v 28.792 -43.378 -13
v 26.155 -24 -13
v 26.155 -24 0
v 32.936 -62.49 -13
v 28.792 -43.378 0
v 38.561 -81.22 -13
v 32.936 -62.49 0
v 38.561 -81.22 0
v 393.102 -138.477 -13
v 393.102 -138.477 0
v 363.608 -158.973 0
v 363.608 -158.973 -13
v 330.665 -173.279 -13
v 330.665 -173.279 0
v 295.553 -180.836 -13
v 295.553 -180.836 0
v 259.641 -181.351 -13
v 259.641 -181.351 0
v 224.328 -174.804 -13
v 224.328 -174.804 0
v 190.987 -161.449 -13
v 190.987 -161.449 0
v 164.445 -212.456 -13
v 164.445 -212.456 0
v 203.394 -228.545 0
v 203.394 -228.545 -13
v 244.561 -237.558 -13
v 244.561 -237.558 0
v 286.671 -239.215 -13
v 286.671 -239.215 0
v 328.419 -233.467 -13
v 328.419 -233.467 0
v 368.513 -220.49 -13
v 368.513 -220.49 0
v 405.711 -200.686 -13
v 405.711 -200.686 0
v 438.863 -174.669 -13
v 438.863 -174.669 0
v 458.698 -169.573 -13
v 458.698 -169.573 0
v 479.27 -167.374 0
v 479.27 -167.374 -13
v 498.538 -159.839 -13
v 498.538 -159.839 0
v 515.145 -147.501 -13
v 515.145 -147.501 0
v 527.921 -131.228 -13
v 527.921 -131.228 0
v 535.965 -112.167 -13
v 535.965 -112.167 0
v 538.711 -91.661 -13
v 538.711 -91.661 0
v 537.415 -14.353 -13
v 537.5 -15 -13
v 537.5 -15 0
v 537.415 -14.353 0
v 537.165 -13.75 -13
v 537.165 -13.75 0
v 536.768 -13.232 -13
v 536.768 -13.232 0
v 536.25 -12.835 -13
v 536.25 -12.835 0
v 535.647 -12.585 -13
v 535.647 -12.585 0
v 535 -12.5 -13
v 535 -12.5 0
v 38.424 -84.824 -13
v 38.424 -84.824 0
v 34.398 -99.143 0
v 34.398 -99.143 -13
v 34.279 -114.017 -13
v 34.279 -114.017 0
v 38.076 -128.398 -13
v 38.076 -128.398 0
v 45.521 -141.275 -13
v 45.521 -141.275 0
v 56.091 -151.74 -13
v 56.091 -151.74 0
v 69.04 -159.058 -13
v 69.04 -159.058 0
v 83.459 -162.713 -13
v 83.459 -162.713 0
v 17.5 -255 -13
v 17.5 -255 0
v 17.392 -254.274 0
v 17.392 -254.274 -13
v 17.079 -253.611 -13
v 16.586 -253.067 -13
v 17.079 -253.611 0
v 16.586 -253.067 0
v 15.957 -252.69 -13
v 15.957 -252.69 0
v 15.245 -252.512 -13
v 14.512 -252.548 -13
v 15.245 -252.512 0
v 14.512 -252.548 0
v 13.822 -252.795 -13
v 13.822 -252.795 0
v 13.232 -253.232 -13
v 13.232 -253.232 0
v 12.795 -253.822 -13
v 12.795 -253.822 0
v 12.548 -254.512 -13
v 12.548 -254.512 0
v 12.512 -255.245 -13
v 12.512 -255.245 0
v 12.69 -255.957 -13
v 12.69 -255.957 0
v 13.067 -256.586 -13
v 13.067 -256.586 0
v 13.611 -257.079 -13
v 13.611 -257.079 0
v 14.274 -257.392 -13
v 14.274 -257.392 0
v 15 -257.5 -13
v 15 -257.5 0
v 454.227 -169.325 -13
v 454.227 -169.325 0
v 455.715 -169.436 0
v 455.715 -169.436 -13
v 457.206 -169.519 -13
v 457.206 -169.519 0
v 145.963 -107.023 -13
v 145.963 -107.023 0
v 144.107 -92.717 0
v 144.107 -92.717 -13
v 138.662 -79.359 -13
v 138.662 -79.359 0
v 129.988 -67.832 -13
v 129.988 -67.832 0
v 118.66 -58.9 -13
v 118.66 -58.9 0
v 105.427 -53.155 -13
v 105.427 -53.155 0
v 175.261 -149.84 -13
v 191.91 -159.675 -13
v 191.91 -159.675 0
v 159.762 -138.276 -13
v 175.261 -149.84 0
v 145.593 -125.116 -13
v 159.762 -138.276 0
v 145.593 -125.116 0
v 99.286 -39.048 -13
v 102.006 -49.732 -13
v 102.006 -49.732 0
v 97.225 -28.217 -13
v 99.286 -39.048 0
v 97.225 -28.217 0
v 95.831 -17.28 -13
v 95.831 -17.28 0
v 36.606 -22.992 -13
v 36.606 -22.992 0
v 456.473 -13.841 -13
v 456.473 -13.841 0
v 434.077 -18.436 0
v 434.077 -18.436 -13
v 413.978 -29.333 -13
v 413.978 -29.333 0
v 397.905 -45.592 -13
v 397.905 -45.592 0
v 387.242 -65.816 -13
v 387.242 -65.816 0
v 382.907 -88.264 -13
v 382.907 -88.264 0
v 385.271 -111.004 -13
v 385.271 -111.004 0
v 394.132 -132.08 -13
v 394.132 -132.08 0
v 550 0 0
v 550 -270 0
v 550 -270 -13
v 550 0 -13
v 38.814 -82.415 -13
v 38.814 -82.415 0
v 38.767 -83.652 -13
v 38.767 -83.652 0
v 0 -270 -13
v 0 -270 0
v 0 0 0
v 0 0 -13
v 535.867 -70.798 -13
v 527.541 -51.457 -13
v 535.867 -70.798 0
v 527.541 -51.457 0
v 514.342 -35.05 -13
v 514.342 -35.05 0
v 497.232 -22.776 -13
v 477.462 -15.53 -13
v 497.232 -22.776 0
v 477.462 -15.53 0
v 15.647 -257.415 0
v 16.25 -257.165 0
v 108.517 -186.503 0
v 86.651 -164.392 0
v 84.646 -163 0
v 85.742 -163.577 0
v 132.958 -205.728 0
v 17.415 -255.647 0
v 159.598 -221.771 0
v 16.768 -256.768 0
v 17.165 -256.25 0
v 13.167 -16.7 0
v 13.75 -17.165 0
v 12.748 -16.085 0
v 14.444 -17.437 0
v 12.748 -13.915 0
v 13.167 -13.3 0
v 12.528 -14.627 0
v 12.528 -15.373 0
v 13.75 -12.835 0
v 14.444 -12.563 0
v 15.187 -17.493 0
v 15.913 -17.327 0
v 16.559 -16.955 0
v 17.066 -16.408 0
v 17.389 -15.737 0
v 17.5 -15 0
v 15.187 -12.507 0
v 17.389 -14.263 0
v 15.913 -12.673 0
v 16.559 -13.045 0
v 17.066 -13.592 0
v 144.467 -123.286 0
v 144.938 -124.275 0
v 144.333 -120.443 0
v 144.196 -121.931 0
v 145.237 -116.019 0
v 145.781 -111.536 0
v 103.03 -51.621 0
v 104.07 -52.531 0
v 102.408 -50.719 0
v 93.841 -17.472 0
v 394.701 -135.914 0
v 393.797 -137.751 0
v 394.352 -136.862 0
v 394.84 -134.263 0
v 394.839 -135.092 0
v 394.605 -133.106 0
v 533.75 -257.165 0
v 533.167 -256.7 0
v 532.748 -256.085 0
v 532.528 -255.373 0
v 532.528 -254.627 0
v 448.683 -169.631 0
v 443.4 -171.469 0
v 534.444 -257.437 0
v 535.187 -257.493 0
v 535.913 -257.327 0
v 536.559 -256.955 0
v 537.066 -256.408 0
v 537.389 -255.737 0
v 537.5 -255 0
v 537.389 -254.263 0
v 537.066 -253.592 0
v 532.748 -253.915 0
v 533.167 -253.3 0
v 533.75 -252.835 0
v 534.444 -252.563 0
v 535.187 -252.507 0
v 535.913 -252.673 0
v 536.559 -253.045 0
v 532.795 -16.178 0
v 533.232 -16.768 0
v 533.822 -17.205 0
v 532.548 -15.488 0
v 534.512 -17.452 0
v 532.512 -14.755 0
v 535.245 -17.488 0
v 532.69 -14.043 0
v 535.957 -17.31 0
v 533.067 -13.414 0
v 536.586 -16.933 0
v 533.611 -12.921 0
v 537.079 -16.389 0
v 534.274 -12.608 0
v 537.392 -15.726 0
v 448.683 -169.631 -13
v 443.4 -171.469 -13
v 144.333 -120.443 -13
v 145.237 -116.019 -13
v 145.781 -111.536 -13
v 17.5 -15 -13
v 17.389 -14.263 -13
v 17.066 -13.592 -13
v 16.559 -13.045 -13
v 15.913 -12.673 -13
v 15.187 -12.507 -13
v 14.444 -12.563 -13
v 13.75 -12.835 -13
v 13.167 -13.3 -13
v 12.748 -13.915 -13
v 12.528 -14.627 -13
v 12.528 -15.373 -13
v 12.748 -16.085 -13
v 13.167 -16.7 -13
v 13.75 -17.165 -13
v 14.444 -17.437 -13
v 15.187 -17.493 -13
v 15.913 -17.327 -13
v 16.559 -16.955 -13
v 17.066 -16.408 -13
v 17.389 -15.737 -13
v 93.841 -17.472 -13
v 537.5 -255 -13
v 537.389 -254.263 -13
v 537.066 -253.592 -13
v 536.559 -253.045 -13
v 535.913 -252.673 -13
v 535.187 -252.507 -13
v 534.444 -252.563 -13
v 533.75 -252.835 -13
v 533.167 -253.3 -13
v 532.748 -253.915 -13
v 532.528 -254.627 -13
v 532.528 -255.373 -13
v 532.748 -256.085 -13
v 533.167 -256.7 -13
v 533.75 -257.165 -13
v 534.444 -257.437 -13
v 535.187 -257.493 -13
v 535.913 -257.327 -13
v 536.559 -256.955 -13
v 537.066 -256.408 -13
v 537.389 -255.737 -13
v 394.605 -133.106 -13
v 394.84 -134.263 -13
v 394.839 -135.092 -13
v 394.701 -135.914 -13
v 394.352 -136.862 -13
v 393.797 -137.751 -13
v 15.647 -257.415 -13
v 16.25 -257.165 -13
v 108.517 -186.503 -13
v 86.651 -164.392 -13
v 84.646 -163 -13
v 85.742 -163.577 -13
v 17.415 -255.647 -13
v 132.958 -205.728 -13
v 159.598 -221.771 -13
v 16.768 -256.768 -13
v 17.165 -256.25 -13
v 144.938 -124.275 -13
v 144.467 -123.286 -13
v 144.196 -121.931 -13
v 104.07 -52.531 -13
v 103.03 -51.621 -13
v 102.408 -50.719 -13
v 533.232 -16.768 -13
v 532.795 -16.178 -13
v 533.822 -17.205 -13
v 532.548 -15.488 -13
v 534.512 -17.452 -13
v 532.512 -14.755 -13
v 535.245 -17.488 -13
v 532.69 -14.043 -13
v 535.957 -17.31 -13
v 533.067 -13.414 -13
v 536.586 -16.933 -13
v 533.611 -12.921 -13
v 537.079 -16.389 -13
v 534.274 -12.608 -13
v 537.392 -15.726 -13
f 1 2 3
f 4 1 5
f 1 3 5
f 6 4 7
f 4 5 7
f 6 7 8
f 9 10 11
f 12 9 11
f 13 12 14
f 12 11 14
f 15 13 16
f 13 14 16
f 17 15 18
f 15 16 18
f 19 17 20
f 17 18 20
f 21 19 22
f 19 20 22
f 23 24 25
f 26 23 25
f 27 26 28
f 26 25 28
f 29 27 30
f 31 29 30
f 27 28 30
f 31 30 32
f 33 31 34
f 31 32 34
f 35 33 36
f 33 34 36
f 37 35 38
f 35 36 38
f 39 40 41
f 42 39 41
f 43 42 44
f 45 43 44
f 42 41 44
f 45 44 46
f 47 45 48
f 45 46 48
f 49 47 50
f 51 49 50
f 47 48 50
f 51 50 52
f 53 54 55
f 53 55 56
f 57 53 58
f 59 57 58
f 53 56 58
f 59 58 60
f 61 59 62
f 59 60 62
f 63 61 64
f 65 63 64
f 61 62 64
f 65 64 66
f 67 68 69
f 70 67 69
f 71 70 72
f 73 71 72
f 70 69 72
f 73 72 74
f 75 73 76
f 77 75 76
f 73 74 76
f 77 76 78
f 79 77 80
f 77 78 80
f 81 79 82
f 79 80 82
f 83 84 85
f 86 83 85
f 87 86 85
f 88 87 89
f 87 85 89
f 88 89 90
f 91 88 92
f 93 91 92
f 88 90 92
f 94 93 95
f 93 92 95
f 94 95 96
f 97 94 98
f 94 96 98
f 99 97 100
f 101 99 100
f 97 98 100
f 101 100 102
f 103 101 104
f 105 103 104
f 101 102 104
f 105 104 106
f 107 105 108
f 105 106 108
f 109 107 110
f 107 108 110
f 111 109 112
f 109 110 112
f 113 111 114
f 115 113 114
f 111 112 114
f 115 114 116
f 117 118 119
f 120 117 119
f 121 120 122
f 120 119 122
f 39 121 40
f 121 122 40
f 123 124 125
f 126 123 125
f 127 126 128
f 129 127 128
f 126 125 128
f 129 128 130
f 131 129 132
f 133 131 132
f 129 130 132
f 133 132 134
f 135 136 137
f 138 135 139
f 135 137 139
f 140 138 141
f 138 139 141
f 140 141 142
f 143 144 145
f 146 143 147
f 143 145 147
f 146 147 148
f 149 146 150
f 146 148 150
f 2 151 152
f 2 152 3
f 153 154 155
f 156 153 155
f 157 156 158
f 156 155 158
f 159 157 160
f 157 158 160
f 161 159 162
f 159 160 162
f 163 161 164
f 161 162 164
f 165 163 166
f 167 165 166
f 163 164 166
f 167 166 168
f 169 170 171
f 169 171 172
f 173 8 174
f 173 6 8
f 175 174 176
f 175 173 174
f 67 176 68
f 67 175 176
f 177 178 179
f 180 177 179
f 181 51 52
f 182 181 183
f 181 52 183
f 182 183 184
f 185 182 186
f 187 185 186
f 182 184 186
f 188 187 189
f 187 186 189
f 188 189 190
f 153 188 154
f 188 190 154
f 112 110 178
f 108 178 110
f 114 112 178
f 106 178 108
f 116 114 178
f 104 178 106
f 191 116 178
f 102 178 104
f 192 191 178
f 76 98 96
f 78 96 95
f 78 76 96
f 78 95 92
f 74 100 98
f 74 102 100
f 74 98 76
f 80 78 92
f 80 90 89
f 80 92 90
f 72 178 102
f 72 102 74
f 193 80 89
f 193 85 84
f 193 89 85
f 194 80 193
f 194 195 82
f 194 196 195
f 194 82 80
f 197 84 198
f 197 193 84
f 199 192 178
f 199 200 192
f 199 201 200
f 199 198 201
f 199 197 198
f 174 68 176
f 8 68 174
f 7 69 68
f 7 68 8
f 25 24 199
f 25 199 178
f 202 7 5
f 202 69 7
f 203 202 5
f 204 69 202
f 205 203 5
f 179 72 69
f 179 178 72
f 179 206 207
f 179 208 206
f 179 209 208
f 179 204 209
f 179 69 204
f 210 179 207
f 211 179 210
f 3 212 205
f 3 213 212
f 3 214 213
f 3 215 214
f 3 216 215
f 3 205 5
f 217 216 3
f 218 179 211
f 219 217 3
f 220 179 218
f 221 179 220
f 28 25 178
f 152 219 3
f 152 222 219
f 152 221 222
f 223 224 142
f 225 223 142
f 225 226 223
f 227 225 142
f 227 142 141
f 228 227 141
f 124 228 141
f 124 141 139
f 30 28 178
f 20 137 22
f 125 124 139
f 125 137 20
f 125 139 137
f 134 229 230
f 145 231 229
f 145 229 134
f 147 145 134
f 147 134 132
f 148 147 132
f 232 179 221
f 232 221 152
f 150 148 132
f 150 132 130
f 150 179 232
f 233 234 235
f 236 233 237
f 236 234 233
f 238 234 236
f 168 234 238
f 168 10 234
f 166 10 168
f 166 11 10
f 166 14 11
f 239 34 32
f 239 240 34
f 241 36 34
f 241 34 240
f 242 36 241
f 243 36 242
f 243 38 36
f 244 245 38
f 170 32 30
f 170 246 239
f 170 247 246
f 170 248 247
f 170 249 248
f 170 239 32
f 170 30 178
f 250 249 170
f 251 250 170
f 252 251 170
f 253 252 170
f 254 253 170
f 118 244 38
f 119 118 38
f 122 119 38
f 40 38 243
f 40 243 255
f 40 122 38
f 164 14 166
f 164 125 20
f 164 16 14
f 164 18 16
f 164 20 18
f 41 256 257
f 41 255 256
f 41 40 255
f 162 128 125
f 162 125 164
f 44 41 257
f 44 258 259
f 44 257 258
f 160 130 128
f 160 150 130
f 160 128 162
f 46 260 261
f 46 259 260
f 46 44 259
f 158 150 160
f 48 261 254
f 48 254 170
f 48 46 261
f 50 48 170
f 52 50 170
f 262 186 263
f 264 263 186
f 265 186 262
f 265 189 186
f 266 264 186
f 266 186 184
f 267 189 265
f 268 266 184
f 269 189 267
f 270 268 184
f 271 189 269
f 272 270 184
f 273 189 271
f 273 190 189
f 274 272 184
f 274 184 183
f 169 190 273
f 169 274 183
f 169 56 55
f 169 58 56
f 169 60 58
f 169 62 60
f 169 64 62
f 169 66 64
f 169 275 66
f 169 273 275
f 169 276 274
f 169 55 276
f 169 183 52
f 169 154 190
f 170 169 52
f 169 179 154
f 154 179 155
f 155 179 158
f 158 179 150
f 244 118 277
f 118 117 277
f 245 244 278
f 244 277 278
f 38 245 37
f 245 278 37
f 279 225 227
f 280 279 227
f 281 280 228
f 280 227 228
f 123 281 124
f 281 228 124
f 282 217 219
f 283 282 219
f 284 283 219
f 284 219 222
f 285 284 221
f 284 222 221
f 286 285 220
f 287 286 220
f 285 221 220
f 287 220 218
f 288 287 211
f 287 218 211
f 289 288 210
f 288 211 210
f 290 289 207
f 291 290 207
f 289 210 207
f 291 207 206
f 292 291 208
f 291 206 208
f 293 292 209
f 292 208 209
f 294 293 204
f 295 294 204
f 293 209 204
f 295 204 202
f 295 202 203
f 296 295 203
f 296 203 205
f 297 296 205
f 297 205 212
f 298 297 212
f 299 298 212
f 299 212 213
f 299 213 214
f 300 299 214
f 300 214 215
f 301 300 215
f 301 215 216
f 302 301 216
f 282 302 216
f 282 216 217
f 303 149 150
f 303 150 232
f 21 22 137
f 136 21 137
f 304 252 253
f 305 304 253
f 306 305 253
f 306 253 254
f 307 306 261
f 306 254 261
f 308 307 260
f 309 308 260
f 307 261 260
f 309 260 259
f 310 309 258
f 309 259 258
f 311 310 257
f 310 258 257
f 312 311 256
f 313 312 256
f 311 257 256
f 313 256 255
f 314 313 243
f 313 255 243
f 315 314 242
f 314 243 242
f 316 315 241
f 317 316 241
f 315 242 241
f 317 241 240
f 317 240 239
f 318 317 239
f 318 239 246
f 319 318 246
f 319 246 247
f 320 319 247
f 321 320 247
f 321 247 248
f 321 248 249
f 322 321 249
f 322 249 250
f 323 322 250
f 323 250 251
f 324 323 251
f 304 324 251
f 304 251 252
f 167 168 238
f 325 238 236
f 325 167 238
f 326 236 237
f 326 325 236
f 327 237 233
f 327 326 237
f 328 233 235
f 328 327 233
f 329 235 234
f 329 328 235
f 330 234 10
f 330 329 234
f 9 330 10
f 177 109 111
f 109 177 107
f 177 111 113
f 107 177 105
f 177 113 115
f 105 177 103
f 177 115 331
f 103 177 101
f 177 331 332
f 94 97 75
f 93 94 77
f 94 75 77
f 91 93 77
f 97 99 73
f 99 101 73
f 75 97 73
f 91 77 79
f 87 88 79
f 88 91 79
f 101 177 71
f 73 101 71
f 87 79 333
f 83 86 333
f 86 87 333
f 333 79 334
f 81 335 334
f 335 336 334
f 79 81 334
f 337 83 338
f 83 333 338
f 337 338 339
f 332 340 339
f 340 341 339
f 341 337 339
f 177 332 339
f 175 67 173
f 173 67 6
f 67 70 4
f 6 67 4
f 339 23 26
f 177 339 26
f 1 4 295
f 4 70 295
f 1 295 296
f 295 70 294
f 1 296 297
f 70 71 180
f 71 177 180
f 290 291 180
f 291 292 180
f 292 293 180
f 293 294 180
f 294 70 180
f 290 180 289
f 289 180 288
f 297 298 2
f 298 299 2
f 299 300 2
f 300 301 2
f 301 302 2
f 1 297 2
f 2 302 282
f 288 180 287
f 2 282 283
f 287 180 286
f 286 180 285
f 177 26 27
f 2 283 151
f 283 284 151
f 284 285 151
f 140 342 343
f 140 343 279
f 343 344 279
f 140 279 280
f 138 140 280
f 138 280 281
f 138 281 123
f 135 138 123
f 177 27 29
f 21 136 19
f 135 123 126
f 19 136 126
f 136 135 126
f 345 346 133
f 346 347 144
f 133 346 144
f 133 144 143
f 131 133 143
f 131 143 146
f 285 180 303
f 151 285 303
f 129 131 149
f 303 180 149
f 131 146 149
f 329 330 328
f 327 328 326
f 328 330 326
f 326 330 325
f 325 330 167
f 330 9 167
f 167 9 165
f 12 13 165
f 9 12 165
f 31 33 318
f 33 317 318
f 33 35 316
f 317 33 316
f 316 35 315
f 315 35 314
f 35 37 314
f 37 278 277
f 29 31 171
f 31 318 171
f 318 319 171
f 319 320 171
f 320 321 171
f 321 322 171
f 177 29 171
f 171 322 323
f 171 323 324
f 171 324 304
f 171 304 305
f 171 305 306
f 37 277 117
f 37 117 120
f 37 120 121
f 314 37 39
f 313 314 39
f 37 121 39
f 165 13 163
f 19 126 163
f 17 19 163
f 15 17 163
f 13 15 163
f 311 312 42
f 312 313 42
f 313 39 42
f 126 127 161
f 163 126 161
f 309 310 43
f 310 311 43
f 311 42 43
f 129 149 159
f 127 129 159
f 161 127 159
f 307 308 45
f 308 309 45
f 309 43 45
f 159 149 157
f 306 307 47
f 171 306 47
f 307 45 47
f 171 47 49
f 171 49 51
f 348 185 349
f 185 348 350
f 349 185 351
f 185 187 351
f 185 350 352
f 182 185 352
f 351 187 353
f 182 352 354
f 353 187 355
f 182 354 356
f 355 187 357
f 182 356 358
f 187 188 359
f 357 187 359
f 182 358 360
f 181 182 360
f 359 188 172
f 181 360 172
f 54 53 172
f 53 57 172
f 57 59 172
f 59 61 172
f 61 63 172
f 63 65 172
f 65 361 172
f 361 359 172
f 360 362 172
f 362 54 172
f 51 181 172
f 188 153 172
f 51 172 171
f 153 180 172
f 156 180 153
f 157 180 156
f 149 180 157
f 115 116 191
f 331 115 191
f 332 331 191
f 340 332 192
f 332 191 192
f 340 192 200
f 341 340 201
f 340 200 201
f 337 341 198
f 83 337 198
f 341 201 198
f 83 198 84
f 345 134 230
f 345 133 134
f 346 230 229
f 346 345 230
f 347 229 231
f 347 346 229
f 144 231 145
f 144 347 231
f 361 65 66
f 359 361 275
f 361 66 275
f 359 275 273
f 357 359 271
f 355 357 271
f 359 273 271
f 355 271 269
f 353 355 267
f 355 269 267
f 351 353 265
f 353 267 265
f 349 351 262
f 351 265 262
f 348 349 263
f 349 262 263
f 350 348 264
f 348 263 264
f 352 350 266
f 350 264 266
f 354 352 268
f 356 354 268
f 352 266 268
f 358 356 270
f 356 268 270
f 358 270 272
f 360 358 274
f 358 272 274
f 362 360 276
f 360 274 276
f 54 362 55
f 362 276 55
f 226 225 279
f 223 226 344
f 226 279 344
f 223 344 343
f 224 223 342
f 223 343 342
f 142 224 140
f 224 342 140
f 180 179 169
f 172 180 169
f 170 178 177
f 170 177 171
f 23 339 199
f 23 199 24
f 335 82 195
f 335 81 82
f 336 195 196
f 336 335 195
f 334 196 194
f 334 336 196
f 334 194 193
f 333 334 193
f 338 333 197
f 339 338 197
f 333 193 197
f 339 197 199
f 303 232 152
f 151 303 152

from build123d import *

# Parameters (mm, degrees)
F0_W     = 550
F0_H     = 270
F1_DEPTH = 13
F2_R     = 2.5
F3_DEPTH = 25
F4_R     = 5
F5_R     = 20


with BuildPart() as f1:
    # F0 (on Top) → F1 (new body)
    with BuildSketch(Plane.XY):
        with Locations((275, -135)):
            Rectangle(F0_W, F0_H)
    extrude(amount=-F1_DEPTH)

    # F2 (on face) → F3 (cut)
    with BuildSketch(Plane.XY):
        with BuildLine():
            ThreePointArc((102.8172889589, -52.4701250099), (119.1726628165, -90.0990620723), (143.6244940218, -123.0466433063))
            ThreePointArc((143.6244940218, -123.0466433063), (145.375436454, -115.11981647), (145.9631920321, -107.023216784))
            ThreePointArc((145.9631920321, -107.023216784), (133.8730301026, -72.2467564476), (102.8172889589, -52.4701250099))
        make_face()
        with BuildLine():
            ThreePointArc((46.4524007703, -71.5977994519), (67.6630708031, -119.8818075906), (98.9269281749, -162.353082441))
            ThreePointArc((98.9269281749, -162.353082441), (126.0574308053, -149.8675419291), (142.9268949098, -125.2225814773))
            ThreePointArc((142.9268949098, -125.2225814773), (117.4412479589, -91.100162762), (100.5834584289, -51.9891337337))
            ThreePointArc((100.5834584289, -51.9891337337), (70.8084957225, -54.3138897804), (46.4524007703, -71.5977994519))
        make_face()
        with BuildLine():
            ThreePointArc((36.6062109858, -22.9924196081), (40.2678425285, -47.5506492992), (46.4524007703, -71.5977994519))
            ThreePointArc((46.4524007703, -71.5977994519), (70.8084957225, -54.3138897804), (100.5834584289, -51.9891337337))
            ThreePointArc((100.5834584289, -51.9891337337), (96.3763447636, -34.89397928), (93.8406279725, -17.4723188671))
            Line((93.8406279725, -17.4723188671), (36.6062109858, -22.9924196081))
        make_face()
        with BuildLine():
            ThreePointArc((26.1547087534, -24.0004380043), (30.8880481953, -53.9384370008), (39.2095922874, -83.0835942334))
            ThreePointArc((39.2095922874, -83.0835942334), (42.4819606163, -77.1205988593), (46.4524007703, -71.5977994519))
            ThreePointArc((46.4524007703, -71.5977994519), (40.2678425285, -47.5506492992), (36.6062109858, -22.9924196081))
            Line((36.6062109858, -22.9924196081), (26.1547087534, -24.0004380043))
        make_face()
        with BuildLine():
            ThreePointArc((39.2095922874, -83.0835942334), (58.5731428007, -125.1375862115), (85.359218008, -162.8998889056))
            ThreePointArc((85.359218008, -162.8998889056), (92.159689712, -163.0387878421), (98.9269281749, -162.353082441))
            ThreePointArc((98.9269281749, -162.353082441), (67.6630708031, -119.8818075906), (46.4524007703, -71.5977994519))
            ThreePointArc((46.4524007703, -71.5977994519), (42.4819606163, -77.1205988593), (39.2095922874, -83.0835942334))
        make_face()
        with BuildLine():
            ThreePointArc((39.2095922874, -83.0835942334), (41.3696850637, -135.0845918815), (85.359218008, -162.8998889056))
            ThreePointArc((85.359218008, -162.8998889056), (58.5731428007, -125.1375862115), (39.2095922874, -83.0835942334))
        make_face()
        with BuildLine():
            ThreePointArc((98.9269281749, -162.353082441), (129.5126452175, -190.2463655327), (164.4445024089, -212.4564236553))
            Line((164.4445024089, -212.4564236553), (190.9870540226, -161.4491403142))
            ThreePointArc((190.9870540226, -161.4491403142), (165.4491613095, -145.3362093293), (142.9268949098, -125.2225814773))
            ThreePointArc((142.9268949098, -125.2225814773), (126.0574308053, -149.8675419291), (98.9269281749, -162.353082441))
        make_face()
        with BuildLine():
            ThreePointArc((85.359218008, -162.8998889056), (119.6639725539, -195.884452107), (159.5976016794, -221.7707971349))
            Line((159.5976016794, -221.7707971349), (164.4445024089, -212.4564236553))
            ThreePointArc((164.4445024089, -212.4564236553), (129.5126452175, -190.2463655327), (98.9269281749, -162.353082441))
            ThreePointArc((98.9269281749, -162.353082441), (92.159689712, -163.0387878421), (85.359218008, -162.8998889056))
        make_face()
        with BuildLine():
            ThreePointArc((142.9268949098, -125.2225814773), (165.4491613095, -145.3362093293), (190.9870540226, -161.4491403142))
            Line((190.9870540226, -161.4491403142), (191.9102732092, -159.6749739371))
            ThreePointArc((191.9102732092, -159.6749739371), (166.2146946142, -143.4076613439), (143.6244940218, -123.0466433063))
            ThreePointArc((143.6244940218, -123.0466433063), (143.2867819227, -124.1381669965), (142.9268949098, -125.2225814773))
        make_face()
        with BuildLine():
            Line((190.9870540226, -161.4491403142), (164.4445024089, -212.4564236553))
            ThreePointArc((164.4445024089, -212.4564236553), (312.3186805101, -236.5746522453), (445.5878496959, -168.1072144083))
            ThreePointArc((445.5878496959, -168.1072144083), (417.7995521532, -156.6837386519), (396.3969974723, -135.5978207964))
            ThreePointArc((396.3969974723, -135.5978207964), (297.7258554679, -180.5755672655), (190.9870540226, -161.4491403142))
        make_face()
        with BuildLine():
            ThreePointArc((396.3969974723, -135.5978207964), (417.7995521532, -156.6837386519), (445.5878496959, -168.1072144083))
            ThreePointArc((445.5878496959, -168.1072144083), (489.778644371, -105.9735057557), (512.2017629268, -33.0994511193))
            ThreePointArc((512.2017629268, -33.0994511193), (486.2288437534, -17.9967113583), (456.4729635167, -13.8406471114))
            ThreePointArc((456.4729635167, -13.8406471114), (438.2138341358, -80.5310148123), (396.3969974723, -135.5978207964))
        make_face()
        with BuildLine():
            ThreePointArc((395.2793152892, -133.9137271289), (395.8326968589, -134.7593972826), (396.3969974723, -135.5978207964))
            ThreePointArc((396.3969974723, -135.5978207964), (438.2138341358, -80.5310148123), (456.4729635167, -13.8406471114))
            ThreePointArc((456.4729635167, -13.8406471114), (391.3304963156, -56.2714595868), (395.2793152892, -133.9137271289))
        make_face()
        with BuildLine():
            ThreePointArc((445.5878496959, -168.1072144083), (452.1119253863, -169.1179747106), (458.6981361528, -169.5729777234))
            ThreePointArc((458.6981361528, -169.5729777234), (515.1450884683, -147.5010120731), (538.711061865, -91.6612861494))
            ThreePointArc((538.711061865, -91.6612861494), (531.7751165183, -59.5200686387), (512.2017629268, -33.0994511193))
            ThreePointArc((512.2017629268, -33.0994511193), (489.778644371, -105.9735057557), (445.5878496959, -168.1072144083))
        make_face()
        with BuildLine():
            ThreePointArc((17.5, -255), (13.232233047, -253.232233047), (15, -257.5))
            ThreePointArc((15, -257.5), (16.767766953, -256.767766953), (17.5, -255))
        make_face()
        with Locations((15, -15)):
            Circle(F2_R)
        with BuildLine():
            ThreePointArc((537.5, -15), (536.767766953, -13.232233047), (535, -12.5))
            ThreePointArc((535, -12.5), (533.232233047, -16.767766953), (537.5, -15))
        make_face()
        with Locations((535, -255)):
            Circle(F2_R)
        with BuildLine():
            ThreePointArc((100.5834584289, -51.9891337337), (117.4412479589, -91.100162762), (142.9268949098, -125.2225814773))
            ThreePointArc((142.9268949098, -125.2225814773), (143.2867819227, -124.1381669965), (143.6244940218, -123.0466433063))
            ThreePointArc((143.6244940218, -123.0466433063), (119.1726628165, -90.0990620723), (102.8172889589, -52.4701250099))
            ThreePointArc((102.8172889589, -52.4701250099), (101.702824577, -52.2182469254), (100.5834584289, -51.9891337337))
        make_face()
        with BuildLine():
            ThreePointArc((93.8406279725, -17.4723188671), (96.3763447636, -34.89397928), (100.5834584289, -51.9891337337))
            ThreePointArc((100.5834584289, -51.9891337337), (101.702824577, -52.2182469254), (102.8172889589, -52.4701250099))
            ThreePointArc((102.8172889589, -52.4701250099), (98.4454239564, -35.0497029669), (95.8313903025, -17.2803153631))
            Line((95.8313903025, -17.2803153631), (93.8406279725, -17.4723188671))
        make_face()
    extrude(amount=-F3_DEPTH, mode=Mode.SUBTRACT)

    # F4
    f4_edges = [f1.edges().sort_by_distance(p)[0] for p in [
        (102.817289, -52.470125, -6.5),
        (143.624494, -123.046643, -6.5),
        (39.209592, -83.083594, -6.5),
        (85.359218, -162.899889, -6.5),
        (396.396997, -135.597821, -6.5),
    ]]
    fillet(f4_edges, radius=F4_R)

    # F5
    f5_edges = [f1.edges().sort_by_distance(p)[0] for p in [
        (445.58785, -168.107214, -6.5),
    ]]
    fillet(f5_edges, radius=F5_R)


solid = f1.part
